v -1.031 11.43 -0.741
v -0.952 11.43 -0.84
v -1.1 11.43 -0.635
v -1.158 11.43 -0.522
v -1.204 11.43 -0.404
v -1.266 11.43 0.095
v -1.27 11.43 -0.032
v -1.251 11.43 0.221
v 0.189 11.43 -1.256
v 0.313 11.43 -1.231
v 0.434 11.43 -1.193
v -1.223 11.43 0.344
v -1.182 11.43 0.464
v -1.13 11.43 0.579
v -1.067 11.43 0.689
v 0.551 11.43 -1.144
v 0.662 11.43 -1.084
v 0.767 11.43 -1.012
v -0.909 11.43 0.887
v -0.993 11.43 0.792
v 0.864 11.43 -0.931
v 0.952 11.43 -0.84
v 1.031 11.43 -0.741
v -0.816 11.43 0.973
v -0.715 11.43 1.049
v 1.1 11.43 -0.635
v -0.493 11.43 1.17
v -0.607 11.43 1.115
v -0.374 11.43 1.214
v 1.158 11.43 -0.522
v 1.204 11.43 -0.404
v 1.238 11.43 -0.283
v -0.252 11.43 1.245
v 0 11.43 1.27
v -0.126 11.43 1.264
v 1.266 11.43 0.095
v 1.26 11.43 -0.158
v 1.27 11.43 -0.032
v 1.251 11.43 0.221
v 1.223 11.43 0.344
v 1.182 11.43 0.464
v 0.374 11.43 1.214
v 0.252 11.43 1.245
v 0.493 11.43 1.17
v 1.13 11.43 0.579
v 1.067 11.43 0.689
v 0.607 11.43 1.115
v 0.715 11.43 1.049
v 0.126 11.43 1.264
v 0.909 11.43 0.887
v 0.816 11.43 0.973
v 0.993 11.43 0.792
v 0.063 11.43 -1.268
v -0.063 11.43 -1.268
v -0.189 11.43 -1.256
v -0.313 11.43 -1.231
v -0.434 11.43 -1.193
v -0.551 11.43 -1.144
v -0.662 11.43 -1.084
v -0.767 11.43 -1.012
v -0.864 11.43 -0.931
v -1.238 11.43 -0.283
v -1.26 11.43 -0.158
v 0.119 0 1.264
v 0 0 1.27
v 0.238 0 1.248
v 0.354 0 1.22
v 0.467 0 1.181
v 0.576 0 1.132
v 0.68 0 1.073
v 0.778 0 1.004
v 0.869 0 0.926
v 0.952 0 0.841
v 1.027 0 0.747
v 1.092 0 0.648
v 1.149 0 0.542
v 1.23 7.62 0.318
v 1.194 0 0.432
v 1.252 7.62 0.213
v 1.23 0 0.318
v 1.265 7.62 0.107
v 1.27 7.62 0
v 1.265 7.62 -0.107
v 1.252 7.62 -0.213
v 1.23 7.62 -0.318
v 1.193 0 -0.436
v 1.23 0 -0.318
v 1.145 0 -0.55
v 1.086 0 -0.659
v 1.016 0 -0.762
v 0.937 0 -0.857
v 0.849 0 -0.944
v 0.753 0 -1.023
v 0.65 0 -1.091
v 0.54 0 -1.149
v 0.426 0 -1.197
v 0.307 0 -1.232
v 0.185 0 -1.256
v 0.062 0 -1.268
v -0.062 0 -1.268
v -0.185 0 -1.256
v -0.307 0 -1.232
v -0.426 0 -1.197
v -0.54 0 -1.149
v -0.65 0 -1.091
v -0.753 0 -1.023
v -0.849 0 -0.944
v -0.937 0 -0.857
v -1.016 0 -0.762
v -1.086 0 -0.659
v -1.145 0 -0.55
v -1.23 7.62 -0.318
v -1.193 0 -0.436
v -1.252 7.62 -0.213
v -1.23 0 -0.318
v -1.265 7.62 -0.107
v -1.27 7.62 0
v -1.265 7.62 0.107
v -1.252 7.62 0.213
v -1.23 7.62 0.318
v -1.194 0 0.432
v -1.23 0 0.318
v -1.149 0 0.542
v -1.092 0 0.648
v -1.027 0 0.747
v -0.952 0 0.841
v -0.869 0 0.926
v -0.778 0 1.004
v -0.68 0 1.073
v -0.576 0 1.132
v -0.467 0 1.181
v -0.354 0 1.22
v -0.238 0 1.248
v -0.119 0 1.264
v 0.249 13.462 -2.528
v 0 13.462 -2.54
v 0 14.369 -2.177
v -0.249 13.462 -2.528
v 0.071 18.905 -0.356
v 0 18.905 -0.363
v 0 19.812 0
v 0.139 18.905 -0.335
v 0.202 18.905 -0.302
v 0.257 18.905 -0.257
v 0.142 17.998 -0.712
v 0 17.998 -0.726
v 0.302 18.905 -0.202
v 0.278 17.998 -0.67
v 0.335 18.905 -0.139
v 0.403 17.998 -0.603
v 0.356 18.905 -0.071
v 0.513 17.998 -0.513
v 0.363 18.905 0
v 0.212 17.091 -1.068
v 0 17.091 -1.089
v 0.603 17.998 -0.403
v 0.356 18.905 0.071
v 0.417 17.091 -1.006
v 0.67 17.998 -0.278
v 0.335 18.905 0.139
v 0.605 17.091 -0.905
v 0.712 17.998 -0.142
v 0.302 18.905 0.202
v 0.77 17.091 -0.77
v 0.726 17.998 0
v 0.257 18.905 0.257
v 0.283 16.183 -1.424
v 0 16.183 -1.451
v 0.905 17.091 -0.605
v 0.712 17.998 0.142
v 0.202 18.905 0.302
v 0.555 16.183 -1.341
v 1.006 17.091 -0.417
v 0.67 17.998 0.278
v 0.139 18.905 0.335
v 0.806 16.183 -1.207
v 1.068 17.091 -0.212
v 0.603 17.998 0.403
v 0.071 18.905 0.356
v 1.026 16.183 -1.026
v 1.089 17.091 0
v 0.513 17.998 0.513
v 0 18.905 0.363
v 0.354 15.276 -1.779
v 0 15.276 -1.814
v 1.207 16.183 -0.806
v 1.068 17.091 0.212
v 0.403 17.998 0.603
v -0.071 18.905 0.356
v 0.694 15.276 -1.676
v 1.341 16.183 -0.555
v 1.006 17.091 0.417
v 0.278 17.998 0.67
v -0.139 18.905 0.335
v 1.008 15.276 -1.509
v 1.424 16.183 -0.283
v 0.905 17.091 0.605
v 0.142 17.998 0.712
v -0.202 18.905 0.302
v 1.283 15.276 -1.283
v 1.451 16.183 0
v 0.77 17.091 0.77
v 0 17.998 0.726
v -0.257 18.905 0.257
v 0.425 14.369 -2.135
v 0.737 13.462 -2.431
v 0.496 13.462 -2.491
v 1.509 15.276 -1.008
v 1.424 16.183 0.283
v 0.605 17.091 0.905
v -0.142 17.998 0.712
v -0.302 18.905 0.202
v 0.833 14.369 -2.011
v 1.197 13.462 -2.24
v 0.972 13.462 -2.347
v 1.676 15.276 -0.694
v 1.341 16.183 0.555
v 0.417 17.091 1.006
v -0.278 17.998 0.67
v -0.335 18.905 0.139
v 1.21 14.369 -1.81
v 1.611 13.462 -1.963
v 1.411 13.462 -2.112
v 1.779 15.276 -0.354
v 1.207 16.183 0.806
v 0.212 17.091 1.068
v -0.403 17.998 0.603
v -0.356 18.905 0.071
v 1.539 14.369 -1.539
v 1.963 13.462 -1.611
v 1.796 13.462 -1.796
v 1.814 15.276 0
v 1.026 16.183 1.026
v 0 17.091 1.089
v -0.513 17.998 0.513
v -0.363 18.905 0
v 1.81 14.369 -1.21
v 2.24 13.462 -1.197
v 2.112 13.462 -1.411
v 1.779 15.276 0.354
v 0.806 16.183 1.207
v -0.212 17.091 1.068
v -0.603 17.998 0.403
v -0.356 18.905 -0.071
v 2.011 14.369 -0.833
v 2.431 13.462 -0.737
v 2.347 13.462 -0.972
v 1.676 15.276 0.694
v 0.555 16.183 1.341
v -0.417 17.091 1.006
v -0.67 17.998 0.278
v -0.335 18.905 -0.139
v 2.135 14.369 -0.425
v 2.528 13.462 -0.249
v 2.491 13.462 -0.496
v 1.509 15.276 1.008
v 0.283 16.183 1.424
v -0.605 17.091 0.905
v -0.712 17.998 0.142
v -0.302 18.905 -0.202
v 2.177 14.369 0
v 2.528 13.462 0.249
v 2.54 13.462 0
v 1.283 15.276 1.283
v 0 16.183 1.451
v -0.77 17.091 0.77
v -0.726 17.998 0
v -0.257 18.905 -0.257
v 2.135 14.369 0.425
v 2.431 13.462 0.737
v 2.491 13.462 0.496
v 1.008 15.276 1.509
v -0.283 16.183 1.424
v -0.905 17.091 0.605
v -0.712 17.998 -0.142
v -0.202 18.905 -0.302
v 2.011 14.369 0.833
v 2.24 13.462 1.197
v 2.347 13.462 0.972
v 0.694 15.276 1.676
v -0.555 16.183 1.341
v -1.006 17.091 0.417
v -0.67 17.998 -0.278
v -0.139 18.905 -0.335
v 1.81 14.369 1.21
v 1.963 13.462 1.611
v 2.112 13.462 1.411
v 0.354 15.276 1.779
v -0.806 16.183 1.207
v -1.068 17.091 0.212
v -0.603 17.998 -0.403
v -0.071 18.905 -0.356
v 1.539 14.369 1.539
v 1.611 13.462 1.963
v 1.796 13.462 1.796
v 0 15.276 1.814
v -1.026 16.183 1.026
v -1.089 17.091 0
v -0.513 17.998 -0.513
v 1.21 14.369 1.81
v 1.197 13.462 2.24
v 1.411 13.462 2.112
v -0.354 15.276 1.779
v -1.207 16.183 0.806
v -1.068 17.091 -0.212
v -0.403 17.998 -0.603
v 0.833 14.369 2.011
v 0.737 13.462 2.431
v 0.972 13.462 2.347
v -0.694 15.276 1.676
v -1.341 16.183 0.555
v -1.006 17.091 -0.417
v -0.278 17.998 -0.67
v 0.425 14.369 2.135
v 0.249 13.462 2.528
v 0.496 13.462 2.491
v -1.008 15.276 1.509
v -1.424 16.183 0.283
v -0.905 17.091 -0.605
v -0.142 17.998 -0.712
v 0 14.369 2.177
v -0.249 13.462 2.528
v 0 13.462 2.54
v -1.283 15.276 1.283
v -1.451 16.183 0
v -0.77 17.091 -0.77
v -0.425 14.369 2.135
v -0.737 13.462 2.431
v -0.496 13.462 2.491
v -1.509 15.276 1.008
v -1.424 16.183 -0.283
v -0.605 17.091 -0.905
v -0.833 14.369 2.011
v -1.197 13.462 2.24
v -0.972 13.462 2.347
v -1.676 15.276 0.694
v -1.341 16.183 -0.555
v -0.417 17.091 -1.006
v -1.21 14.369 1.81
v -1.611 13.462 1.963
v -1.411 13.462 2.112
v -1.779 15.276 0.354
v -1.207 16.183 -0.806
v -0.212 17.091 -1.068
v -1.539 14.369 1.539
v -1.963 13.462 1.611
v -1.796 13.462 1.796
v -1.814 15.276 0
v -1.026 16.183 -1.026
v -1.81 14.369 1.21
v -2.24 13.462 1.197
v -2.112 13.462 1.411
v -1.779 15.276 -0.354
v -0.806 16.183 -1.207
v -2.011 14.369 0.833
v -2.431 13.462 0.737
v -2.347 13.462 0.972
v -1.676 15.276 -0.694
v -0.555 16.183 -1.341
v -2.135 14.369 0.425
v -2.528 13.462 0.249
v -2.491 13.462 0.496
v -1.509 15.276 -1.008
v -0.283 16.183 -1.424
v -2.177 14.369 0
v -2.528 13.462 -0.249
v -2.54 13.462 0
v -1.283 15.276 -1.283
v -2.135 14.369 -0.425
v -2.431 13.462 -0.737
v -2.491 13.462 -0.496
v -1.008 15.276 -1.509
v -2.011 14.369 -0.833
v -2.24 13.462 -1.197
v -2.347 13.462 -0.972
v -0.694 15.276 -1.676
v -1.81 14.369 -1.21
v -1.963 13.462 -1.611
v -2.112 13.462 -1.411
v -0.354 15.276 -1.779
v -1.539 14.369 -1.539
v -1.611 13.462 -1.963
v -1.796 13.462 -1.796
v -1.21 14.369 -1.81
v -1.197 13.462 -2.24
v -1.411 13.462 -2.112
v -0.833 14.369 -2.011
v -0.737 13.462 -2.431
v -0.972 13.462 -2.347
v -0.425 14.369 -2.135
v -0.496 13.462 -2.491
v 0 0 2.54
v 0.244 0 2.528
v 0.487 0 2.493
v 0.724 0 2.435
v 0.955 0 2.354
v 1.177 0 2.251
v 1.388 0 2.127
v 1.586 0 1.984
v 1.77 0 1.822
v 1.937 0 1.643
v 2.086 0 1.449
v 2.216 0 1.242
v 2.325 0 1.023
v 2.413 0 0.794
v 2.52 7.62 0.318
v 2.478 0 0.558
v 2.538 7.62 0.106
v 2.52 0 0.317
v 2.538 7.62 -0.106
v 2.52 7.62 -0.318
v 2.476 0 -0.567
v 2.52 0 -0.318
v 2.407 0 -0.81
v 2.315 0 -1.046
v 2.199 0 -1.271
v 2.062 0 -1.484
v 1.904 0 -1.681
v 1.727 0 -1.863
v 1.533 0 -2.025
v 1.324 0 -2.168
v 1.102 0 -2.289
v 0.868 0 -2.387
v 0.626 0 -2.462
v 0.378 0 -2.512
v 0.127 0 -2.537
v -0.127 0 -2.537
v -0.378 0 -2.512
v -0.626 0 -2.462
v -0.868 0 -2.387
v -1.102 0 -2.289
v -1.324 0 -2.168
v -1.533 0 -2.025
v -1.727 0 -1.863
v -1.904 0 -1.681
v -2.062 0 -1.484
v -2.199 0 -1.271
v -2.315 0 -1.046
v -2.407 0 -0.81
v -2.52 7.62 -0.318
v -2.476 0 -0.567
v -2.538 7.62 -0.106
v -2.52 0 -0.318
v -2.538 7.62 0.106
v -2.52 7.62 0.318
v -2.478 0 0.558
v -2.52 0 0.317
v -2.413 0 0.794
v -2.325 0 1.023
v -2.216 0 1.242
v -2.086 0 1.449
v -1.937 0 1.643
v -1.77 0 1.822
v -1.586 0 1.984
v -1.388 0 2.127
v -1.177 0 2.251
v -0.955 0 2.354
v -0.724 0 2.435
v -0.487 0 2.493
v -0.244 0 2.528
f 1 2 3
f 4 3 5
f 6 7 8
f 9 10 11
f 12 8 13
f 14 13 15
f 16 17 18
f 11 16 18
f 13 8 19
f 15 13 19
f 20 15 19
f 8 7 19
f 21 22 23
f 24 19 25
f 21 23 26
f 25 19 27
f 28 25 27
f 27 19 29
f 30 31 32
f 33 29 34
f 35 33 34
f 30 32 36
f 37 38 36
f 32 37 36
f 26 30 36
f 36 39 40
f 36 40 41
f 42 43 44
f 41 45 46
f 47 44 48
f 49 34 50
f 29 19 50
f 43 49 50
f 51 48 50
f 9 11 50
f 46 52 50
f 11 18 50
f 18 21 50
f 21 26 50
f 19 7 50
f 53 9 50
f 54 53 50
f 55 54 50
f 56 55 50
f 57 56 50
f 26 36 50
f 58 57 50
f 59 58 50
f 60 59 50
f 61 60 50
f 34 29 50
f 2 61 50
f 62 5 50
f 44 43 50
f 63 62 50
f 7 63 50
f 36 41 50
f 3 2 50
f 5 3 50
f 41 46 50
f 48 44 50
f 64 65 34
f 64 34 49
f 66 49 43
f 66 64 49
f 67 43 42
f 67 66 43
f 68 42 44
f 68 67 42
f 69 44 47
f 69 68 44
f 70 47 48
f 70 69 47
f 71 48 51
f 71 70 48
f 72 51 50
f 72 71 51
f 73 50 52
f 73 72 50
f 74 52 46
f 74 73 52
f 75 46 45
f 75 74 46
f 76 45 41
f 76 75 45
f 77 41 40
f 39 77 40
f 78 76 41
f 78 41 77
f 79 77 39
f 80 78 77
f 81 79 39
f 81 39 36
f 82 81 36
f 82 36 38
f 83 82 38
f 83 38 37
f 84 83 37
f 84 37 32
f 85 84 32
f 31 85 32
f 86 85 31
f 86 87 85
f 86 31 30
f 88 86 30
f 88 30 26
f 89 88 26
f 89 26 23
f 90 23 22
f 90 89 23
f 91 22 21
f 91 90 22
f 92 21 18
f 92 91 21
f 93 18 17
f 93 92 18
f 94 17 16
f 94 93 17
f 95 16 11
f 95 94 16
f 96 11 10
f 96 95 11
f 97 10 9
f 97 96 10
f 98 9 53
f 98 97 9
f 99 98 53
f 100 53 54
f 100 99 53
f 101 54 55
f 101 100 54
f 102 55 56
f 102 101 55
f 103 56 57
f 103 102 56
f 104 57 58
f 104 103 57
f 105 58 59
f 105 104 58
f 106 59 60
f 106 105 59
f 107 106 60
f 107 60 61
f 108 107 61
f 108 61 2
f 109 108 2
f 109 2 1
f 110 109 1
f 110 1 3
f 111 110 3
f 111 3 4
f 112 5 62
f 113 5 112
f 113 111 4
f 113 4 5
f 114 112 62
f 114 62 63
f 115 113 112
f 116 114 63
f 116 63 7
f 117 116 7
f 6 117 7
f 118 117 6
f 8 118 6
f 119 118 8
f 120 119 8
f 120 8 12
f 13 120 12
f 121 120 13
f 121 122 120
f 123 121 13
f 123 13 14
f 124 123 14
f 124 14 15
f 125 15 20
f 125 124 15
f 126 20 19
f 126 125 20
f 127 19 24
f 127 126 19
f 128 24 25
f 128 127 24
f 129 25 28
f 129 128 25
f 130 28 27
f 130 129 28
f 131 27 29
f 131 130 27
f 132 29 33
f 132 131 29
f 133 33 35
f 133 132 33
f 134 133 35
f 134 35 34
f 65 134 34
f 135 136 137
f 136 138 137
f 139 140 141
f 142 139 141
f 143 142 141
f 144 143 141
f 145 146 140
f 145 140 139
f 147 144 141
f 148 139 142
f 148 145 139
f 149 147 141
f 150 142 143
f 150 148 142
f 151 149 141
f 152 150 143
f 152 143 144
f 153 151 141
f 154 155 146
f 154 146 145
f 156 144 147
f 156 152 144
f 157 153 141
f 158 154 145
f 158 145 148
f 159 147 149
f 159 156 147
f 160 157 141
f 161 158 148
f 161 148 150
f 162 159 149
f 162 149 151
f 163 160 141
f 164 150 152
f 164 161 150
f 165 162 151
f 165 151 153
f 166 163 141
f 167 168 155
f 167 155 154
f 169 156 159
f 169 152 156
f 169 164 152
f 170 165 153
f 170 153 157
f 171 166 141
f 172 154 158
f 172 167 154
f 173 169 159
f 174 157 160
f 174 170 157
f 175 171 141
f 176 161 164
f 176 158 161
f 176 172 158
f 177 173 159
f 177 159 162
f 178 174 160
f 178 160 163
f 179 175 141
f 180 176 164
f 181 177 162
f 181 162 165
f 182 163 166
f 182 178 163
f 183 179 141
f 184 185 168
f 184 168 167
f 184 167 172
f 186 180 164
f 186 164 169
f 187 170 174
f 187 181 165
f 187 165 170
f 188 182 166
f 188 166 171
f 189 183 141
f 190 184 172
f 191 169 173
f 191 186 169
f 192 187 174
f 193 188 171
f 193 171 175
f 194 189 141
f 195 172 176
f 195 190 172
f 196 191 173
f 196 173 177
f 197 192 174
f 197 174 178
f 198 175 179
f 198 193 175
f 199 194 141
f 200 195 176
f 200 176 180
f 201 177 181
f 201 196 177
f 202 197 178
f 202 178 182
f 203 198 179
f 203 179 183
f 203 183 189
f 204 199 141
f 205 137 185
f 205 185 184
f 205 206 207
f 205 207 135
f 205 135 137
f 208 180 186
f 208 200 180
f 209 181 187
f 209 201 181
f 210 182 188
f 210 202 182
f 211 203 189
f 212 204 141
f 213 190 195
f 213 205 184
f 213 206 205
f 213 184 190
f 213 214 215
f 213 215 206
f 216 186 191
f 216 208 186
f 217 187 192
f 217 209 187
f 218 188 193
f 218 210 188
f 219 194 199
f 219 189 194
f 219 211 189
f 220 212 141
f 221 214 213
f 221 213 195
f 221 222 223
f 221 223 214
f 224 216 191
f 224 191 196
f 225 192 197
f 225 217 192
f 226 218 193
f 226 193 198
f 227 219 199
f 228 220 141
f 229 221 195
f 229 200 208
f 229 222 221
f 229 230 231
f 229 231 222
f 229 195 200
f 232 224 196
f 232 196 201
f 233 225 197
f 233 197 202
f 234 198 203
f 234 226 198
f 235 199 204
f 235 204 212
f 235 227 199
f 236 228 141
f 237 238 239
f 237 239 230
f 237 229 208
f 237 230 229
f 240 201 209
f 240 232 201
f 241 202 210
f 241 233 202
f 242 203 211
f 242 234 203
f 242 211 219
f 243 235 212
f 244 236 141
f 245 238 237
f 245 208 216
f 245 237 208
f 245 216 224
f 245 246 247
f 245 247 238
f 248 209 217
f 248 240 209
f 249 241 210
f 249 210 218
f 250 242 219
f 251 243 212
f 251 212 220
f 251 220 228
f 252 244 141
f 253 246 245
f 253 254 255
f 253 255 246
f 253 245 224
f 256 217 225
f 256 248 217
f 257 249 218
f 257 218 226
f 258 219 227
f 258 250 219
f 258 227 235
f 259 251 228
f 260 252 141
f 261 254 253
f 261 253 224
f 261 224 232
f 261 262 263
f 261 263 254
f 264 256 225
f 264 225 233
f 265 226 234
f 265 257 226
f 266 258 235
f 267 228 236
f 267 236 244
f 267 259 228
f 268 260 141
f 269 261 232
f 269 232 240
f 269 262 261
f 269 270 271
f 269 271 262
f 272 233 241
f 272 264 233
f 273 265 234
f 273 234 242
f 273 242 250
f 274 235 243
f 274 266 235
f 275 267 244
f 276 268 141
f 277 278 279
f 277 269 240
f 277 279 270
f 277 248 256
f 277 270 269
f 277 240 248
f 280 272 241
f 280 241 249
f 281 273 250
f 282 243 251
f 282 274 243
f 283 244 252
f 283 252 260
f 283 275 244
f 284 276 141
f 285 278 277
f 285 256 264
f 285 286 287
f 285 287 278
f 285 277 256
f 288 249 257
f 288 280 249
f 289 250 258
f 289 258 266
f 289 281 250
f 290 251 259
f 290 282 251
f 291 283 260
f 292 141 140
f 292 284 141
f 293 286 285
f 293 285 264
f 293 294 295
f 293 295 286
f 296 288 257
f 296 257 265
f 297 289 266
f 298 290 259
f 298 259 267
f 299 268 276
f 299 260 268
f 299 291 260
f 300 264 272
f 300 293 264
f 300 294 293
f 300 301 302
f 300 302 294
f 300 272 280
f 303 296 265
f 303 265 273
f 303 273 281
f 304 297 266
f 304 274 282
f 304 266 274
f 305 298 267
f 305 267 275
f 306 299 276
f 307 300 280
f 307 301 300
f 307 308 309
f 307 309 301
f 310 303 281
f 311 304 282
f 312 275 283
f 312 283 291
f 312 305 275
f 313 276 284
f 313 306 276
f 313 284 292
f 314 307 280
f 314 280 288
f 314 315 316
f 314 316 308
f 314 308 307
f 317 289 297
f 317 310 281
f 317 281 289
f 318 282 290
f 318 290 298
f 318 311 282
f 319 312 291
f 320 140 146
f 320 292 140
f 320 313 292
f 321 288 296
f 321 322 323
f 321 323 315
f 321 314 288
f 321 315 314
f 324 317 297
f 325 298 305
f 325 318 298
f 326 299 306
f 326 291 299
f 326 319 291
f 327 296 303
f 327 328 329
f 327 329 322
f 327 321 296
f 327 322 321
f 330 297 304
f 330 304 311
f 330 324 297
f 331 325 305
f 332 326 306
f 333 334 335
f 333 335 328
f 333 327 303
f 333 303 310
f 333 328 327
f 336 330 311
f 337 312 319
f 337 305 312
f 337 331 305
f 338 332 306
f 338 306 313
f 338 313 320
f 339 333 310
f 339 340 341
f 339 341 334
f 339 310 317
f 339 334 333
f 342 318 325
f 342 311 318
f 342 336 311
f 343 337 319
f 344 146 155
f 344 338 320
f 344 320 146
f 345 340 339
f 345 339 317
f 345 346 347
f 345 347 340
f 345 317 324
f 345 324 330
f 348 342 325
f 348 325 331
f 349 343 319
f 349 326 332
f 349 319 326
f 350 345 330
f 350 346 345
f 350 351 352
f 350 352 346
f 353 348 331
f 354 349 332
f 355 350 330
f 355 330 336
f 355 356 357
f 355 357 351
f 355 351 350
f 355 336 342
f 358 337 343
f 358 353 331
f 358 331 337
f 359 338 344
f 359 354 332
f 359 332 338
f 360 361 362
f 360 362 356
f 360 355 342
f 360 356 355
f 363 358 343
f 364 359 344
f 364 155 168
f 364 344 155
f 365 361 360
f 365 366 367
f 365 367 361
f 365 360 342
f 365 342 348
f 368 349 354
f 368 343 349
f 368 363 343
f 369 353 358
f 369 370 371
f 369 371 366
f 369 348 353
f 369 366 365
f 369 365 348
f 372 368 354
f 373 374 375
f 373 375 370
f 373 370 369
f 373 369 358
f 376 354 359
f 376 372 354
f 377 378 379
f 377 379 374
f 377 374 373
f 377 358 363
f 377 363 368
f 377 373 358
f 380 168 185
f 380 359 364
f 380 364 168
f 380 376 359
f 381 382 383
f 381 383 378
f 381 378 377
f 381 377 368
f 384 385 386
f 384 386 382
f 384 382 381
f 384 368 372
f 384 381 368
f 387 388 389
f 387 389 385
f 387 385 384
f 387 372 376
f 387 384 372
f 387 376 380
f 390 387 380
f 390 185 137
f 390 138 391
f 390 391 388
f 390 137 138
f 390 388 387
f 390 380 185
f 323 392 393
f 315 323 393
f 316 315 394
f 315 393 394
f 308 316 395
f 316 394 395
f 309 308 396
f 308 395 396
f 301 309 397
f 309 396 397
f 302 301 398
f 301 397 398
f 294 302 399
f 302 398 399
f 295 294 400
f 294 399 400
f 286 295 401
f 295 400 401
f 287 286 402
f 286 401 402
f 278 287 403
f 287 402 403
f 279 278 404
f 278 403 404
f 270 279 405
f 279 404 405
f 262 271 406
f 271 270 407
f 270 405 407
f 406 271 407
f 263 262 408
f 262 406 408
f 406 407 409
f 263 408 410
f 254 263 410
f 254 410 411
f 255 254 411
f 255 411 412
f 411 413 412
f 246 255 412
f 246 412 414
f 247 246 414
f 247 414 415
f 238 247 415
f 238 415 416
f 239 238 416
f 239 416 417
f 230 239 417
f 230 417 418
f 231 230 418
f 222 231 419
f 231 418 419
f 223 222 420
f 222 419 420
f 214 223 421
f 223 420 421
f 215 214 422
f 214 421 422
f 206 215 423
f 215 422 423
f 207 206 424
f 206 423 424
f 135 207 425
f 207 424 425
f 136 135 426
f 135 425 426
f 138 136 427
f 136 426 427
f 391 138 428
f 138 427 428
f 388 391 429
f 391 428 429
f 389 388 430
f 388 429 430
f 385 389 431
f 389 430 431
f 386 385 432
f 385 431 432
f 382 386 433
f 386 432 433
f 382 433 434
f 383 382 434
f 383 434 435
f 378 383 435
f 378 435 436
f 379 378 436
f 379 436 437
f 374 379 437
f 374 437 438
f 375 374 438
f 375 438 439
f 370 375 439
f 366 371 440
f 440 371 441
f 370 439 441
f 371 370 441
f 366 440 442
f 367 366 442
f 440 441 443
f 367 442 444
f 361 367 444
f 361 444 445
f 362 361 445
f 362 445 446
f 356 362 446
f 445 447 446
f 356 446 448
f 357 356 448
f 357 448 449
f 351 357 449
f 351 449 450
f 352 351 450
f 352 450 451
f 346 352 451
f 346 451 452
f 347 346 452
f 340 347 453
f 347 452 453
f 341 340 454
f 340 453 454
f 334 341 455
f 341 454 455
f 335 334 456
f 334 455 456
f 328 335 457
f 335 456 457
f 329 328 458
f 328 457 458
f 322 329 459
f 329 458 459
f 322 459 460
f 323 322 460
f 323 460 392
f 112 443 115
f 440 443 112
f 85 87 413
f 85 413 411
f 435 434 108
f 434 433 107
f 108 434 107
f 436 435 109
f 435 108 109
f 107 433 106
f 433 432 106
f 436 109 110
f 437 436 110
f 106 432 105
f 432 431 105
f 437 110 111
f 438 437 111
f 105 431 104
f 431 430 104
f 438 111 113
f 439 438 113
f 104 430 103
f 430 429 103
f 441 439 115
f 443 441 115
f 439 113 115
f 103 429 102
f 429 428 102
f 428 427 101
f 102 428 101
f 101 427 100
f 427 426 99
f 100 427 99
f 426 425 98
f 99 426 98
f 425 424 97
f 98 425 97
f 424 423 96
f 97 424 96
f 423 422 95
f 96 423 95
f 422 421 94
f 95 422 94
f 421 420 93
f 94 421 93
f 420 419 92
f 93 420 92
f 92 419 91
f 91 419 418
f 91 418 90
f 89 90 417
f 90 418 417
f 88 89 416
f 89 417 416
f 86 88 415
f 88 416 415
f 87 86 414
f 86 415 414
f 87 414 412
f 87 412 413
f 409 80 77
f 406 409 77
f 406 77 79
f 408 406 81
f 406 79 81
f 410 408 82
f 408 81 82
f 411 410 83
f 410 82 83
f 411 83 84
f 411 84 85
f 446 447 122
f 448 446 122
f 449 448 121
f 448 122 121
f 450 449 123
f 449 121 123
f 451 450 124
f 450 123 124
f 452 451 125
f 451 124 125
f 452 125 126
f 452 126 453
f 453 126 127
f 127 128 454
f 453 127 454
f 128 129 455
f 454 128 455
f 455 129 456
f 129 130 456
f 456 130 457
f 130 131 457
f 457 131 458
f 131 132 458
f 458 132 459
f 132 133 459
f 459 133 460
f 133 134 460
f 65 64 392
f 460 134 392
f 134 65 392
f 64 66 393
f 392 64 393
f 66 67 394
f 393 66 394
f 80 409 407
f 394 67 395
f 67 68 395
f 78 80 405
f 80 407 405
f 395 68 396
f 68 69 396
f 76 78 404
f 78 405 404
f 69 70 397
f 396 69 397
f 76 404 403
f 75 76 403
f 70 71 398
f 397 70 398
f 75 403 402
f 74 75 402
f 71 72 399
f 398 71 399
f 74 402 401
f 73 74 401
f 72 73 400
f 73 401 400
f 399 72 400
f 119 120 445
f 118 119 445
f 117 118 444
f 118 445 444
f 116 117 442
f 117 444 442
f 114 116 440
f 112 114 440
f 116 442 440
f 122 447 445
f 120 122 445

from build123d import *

# Parameters (mm, degrees)
SKETCH1_R               = 2.54
SKETCH1_R_2             = 1.27
BOSS_EXTRUDE1_DEPTH     = 11.43
BOSS_EXTRUDE2_START     = 11.43
SKETCH1_2_R             = 2.54
SKETCH1_2_R_2           = 1.27
BOSS_EXTRUDE2_DEPTH     = 2.032
CUT_EXTRUDE1_DEPTH      = 21.135007922
CUT_EXTRUDE1_DEPTH_BACK = 21.135007922
SKETCH4_W               = 0.635
SKETCH4_H               = 7.62


with BuildPart() as part:
    # Sketch1 → Boss-Extrude1 (new body)
    with BuildSketch(Plane(origin=(0, 0, 0), x_dir=(1, 0, 0), z_dir=(0, 1, 0))):
        with Locations(Location((0, 0, 0), (0, 0, 270))):
            Circle(SKETCH1_R)
        with Locations(Location((0, 0, 0), (0, 0, 270))):
            Circle(SKETCH1_R_2, mode=Mode.SUBTRACT)
    extrude(amount=BOSS_EXTRUDE1_DEPTH)

    # Sketch1<2> → Boss-Extrude2 (add)
    # profile 1 of 2: a face of its own
    with BuildSketch(Plane(origin=(0, 0, 0), x_dir=(1, 0, 0), z_dir=(0, 1, 0)).offset(BOSS_EXTRUDE2_START)):
        with Locations(Location((0, 0, 0), (0, 0, 270))):
            Circle(SKETCH1_2_R)
        with Locations(Location((0, 0, 0), (0, 0, 270))):
            Circle(SKETCH1_2_R_2, mode=Mode.SUBTRACT)
    # profile 2 of 2: a face of its own
    with BuildSketch(Plane(origin=(0, 0, 0), x_dir=(1, 0, 0), z_dir=(0, 1, 0)).offset(BOSS_EXTRUDE2_START)):
        with Locations(Location((0, 0, 0), (0, 0, 270))):
            Circle(SKETCH1_2_R_2)
    extrude(amount=BOSS_EXTRUDE2_DEPTH)

    # Sketch3 → Revolve1 (revolve)
    with BuildSketch(Plane(origin=(0, 0, 0), x_dir=(0, 0, -1), z_dir=(1, 0, 0))):
        Polygon((0, 13.462), (0, 19.812), (2.54, 13.462), align=None)
    revolve(axis=Axis((0, 13.462, 0), (0, -1, 0)))

    # Sketch4 → Cut-Extrude1 (cut, two sides: drawn at the far end of the back side and taken through both)
    with BuildSketch(Plane(origin=(0, 0, 0), x_dir=(0, 0, -1), z_dir=(1, 0, 0)).offset(-CUT_EXTRUDE1_DEPTH_BACK)):
        with Locations((0, 3.81)):
            Rectangle(SKETCH4_W, SKETCH4_H)
    extrude(amount=CUT_EXTRUDE1_DEPTH + CUT_EXTRUDE1_DEPTH_BACK, mode=Mode.SUBTRACT)


solid = part.part
